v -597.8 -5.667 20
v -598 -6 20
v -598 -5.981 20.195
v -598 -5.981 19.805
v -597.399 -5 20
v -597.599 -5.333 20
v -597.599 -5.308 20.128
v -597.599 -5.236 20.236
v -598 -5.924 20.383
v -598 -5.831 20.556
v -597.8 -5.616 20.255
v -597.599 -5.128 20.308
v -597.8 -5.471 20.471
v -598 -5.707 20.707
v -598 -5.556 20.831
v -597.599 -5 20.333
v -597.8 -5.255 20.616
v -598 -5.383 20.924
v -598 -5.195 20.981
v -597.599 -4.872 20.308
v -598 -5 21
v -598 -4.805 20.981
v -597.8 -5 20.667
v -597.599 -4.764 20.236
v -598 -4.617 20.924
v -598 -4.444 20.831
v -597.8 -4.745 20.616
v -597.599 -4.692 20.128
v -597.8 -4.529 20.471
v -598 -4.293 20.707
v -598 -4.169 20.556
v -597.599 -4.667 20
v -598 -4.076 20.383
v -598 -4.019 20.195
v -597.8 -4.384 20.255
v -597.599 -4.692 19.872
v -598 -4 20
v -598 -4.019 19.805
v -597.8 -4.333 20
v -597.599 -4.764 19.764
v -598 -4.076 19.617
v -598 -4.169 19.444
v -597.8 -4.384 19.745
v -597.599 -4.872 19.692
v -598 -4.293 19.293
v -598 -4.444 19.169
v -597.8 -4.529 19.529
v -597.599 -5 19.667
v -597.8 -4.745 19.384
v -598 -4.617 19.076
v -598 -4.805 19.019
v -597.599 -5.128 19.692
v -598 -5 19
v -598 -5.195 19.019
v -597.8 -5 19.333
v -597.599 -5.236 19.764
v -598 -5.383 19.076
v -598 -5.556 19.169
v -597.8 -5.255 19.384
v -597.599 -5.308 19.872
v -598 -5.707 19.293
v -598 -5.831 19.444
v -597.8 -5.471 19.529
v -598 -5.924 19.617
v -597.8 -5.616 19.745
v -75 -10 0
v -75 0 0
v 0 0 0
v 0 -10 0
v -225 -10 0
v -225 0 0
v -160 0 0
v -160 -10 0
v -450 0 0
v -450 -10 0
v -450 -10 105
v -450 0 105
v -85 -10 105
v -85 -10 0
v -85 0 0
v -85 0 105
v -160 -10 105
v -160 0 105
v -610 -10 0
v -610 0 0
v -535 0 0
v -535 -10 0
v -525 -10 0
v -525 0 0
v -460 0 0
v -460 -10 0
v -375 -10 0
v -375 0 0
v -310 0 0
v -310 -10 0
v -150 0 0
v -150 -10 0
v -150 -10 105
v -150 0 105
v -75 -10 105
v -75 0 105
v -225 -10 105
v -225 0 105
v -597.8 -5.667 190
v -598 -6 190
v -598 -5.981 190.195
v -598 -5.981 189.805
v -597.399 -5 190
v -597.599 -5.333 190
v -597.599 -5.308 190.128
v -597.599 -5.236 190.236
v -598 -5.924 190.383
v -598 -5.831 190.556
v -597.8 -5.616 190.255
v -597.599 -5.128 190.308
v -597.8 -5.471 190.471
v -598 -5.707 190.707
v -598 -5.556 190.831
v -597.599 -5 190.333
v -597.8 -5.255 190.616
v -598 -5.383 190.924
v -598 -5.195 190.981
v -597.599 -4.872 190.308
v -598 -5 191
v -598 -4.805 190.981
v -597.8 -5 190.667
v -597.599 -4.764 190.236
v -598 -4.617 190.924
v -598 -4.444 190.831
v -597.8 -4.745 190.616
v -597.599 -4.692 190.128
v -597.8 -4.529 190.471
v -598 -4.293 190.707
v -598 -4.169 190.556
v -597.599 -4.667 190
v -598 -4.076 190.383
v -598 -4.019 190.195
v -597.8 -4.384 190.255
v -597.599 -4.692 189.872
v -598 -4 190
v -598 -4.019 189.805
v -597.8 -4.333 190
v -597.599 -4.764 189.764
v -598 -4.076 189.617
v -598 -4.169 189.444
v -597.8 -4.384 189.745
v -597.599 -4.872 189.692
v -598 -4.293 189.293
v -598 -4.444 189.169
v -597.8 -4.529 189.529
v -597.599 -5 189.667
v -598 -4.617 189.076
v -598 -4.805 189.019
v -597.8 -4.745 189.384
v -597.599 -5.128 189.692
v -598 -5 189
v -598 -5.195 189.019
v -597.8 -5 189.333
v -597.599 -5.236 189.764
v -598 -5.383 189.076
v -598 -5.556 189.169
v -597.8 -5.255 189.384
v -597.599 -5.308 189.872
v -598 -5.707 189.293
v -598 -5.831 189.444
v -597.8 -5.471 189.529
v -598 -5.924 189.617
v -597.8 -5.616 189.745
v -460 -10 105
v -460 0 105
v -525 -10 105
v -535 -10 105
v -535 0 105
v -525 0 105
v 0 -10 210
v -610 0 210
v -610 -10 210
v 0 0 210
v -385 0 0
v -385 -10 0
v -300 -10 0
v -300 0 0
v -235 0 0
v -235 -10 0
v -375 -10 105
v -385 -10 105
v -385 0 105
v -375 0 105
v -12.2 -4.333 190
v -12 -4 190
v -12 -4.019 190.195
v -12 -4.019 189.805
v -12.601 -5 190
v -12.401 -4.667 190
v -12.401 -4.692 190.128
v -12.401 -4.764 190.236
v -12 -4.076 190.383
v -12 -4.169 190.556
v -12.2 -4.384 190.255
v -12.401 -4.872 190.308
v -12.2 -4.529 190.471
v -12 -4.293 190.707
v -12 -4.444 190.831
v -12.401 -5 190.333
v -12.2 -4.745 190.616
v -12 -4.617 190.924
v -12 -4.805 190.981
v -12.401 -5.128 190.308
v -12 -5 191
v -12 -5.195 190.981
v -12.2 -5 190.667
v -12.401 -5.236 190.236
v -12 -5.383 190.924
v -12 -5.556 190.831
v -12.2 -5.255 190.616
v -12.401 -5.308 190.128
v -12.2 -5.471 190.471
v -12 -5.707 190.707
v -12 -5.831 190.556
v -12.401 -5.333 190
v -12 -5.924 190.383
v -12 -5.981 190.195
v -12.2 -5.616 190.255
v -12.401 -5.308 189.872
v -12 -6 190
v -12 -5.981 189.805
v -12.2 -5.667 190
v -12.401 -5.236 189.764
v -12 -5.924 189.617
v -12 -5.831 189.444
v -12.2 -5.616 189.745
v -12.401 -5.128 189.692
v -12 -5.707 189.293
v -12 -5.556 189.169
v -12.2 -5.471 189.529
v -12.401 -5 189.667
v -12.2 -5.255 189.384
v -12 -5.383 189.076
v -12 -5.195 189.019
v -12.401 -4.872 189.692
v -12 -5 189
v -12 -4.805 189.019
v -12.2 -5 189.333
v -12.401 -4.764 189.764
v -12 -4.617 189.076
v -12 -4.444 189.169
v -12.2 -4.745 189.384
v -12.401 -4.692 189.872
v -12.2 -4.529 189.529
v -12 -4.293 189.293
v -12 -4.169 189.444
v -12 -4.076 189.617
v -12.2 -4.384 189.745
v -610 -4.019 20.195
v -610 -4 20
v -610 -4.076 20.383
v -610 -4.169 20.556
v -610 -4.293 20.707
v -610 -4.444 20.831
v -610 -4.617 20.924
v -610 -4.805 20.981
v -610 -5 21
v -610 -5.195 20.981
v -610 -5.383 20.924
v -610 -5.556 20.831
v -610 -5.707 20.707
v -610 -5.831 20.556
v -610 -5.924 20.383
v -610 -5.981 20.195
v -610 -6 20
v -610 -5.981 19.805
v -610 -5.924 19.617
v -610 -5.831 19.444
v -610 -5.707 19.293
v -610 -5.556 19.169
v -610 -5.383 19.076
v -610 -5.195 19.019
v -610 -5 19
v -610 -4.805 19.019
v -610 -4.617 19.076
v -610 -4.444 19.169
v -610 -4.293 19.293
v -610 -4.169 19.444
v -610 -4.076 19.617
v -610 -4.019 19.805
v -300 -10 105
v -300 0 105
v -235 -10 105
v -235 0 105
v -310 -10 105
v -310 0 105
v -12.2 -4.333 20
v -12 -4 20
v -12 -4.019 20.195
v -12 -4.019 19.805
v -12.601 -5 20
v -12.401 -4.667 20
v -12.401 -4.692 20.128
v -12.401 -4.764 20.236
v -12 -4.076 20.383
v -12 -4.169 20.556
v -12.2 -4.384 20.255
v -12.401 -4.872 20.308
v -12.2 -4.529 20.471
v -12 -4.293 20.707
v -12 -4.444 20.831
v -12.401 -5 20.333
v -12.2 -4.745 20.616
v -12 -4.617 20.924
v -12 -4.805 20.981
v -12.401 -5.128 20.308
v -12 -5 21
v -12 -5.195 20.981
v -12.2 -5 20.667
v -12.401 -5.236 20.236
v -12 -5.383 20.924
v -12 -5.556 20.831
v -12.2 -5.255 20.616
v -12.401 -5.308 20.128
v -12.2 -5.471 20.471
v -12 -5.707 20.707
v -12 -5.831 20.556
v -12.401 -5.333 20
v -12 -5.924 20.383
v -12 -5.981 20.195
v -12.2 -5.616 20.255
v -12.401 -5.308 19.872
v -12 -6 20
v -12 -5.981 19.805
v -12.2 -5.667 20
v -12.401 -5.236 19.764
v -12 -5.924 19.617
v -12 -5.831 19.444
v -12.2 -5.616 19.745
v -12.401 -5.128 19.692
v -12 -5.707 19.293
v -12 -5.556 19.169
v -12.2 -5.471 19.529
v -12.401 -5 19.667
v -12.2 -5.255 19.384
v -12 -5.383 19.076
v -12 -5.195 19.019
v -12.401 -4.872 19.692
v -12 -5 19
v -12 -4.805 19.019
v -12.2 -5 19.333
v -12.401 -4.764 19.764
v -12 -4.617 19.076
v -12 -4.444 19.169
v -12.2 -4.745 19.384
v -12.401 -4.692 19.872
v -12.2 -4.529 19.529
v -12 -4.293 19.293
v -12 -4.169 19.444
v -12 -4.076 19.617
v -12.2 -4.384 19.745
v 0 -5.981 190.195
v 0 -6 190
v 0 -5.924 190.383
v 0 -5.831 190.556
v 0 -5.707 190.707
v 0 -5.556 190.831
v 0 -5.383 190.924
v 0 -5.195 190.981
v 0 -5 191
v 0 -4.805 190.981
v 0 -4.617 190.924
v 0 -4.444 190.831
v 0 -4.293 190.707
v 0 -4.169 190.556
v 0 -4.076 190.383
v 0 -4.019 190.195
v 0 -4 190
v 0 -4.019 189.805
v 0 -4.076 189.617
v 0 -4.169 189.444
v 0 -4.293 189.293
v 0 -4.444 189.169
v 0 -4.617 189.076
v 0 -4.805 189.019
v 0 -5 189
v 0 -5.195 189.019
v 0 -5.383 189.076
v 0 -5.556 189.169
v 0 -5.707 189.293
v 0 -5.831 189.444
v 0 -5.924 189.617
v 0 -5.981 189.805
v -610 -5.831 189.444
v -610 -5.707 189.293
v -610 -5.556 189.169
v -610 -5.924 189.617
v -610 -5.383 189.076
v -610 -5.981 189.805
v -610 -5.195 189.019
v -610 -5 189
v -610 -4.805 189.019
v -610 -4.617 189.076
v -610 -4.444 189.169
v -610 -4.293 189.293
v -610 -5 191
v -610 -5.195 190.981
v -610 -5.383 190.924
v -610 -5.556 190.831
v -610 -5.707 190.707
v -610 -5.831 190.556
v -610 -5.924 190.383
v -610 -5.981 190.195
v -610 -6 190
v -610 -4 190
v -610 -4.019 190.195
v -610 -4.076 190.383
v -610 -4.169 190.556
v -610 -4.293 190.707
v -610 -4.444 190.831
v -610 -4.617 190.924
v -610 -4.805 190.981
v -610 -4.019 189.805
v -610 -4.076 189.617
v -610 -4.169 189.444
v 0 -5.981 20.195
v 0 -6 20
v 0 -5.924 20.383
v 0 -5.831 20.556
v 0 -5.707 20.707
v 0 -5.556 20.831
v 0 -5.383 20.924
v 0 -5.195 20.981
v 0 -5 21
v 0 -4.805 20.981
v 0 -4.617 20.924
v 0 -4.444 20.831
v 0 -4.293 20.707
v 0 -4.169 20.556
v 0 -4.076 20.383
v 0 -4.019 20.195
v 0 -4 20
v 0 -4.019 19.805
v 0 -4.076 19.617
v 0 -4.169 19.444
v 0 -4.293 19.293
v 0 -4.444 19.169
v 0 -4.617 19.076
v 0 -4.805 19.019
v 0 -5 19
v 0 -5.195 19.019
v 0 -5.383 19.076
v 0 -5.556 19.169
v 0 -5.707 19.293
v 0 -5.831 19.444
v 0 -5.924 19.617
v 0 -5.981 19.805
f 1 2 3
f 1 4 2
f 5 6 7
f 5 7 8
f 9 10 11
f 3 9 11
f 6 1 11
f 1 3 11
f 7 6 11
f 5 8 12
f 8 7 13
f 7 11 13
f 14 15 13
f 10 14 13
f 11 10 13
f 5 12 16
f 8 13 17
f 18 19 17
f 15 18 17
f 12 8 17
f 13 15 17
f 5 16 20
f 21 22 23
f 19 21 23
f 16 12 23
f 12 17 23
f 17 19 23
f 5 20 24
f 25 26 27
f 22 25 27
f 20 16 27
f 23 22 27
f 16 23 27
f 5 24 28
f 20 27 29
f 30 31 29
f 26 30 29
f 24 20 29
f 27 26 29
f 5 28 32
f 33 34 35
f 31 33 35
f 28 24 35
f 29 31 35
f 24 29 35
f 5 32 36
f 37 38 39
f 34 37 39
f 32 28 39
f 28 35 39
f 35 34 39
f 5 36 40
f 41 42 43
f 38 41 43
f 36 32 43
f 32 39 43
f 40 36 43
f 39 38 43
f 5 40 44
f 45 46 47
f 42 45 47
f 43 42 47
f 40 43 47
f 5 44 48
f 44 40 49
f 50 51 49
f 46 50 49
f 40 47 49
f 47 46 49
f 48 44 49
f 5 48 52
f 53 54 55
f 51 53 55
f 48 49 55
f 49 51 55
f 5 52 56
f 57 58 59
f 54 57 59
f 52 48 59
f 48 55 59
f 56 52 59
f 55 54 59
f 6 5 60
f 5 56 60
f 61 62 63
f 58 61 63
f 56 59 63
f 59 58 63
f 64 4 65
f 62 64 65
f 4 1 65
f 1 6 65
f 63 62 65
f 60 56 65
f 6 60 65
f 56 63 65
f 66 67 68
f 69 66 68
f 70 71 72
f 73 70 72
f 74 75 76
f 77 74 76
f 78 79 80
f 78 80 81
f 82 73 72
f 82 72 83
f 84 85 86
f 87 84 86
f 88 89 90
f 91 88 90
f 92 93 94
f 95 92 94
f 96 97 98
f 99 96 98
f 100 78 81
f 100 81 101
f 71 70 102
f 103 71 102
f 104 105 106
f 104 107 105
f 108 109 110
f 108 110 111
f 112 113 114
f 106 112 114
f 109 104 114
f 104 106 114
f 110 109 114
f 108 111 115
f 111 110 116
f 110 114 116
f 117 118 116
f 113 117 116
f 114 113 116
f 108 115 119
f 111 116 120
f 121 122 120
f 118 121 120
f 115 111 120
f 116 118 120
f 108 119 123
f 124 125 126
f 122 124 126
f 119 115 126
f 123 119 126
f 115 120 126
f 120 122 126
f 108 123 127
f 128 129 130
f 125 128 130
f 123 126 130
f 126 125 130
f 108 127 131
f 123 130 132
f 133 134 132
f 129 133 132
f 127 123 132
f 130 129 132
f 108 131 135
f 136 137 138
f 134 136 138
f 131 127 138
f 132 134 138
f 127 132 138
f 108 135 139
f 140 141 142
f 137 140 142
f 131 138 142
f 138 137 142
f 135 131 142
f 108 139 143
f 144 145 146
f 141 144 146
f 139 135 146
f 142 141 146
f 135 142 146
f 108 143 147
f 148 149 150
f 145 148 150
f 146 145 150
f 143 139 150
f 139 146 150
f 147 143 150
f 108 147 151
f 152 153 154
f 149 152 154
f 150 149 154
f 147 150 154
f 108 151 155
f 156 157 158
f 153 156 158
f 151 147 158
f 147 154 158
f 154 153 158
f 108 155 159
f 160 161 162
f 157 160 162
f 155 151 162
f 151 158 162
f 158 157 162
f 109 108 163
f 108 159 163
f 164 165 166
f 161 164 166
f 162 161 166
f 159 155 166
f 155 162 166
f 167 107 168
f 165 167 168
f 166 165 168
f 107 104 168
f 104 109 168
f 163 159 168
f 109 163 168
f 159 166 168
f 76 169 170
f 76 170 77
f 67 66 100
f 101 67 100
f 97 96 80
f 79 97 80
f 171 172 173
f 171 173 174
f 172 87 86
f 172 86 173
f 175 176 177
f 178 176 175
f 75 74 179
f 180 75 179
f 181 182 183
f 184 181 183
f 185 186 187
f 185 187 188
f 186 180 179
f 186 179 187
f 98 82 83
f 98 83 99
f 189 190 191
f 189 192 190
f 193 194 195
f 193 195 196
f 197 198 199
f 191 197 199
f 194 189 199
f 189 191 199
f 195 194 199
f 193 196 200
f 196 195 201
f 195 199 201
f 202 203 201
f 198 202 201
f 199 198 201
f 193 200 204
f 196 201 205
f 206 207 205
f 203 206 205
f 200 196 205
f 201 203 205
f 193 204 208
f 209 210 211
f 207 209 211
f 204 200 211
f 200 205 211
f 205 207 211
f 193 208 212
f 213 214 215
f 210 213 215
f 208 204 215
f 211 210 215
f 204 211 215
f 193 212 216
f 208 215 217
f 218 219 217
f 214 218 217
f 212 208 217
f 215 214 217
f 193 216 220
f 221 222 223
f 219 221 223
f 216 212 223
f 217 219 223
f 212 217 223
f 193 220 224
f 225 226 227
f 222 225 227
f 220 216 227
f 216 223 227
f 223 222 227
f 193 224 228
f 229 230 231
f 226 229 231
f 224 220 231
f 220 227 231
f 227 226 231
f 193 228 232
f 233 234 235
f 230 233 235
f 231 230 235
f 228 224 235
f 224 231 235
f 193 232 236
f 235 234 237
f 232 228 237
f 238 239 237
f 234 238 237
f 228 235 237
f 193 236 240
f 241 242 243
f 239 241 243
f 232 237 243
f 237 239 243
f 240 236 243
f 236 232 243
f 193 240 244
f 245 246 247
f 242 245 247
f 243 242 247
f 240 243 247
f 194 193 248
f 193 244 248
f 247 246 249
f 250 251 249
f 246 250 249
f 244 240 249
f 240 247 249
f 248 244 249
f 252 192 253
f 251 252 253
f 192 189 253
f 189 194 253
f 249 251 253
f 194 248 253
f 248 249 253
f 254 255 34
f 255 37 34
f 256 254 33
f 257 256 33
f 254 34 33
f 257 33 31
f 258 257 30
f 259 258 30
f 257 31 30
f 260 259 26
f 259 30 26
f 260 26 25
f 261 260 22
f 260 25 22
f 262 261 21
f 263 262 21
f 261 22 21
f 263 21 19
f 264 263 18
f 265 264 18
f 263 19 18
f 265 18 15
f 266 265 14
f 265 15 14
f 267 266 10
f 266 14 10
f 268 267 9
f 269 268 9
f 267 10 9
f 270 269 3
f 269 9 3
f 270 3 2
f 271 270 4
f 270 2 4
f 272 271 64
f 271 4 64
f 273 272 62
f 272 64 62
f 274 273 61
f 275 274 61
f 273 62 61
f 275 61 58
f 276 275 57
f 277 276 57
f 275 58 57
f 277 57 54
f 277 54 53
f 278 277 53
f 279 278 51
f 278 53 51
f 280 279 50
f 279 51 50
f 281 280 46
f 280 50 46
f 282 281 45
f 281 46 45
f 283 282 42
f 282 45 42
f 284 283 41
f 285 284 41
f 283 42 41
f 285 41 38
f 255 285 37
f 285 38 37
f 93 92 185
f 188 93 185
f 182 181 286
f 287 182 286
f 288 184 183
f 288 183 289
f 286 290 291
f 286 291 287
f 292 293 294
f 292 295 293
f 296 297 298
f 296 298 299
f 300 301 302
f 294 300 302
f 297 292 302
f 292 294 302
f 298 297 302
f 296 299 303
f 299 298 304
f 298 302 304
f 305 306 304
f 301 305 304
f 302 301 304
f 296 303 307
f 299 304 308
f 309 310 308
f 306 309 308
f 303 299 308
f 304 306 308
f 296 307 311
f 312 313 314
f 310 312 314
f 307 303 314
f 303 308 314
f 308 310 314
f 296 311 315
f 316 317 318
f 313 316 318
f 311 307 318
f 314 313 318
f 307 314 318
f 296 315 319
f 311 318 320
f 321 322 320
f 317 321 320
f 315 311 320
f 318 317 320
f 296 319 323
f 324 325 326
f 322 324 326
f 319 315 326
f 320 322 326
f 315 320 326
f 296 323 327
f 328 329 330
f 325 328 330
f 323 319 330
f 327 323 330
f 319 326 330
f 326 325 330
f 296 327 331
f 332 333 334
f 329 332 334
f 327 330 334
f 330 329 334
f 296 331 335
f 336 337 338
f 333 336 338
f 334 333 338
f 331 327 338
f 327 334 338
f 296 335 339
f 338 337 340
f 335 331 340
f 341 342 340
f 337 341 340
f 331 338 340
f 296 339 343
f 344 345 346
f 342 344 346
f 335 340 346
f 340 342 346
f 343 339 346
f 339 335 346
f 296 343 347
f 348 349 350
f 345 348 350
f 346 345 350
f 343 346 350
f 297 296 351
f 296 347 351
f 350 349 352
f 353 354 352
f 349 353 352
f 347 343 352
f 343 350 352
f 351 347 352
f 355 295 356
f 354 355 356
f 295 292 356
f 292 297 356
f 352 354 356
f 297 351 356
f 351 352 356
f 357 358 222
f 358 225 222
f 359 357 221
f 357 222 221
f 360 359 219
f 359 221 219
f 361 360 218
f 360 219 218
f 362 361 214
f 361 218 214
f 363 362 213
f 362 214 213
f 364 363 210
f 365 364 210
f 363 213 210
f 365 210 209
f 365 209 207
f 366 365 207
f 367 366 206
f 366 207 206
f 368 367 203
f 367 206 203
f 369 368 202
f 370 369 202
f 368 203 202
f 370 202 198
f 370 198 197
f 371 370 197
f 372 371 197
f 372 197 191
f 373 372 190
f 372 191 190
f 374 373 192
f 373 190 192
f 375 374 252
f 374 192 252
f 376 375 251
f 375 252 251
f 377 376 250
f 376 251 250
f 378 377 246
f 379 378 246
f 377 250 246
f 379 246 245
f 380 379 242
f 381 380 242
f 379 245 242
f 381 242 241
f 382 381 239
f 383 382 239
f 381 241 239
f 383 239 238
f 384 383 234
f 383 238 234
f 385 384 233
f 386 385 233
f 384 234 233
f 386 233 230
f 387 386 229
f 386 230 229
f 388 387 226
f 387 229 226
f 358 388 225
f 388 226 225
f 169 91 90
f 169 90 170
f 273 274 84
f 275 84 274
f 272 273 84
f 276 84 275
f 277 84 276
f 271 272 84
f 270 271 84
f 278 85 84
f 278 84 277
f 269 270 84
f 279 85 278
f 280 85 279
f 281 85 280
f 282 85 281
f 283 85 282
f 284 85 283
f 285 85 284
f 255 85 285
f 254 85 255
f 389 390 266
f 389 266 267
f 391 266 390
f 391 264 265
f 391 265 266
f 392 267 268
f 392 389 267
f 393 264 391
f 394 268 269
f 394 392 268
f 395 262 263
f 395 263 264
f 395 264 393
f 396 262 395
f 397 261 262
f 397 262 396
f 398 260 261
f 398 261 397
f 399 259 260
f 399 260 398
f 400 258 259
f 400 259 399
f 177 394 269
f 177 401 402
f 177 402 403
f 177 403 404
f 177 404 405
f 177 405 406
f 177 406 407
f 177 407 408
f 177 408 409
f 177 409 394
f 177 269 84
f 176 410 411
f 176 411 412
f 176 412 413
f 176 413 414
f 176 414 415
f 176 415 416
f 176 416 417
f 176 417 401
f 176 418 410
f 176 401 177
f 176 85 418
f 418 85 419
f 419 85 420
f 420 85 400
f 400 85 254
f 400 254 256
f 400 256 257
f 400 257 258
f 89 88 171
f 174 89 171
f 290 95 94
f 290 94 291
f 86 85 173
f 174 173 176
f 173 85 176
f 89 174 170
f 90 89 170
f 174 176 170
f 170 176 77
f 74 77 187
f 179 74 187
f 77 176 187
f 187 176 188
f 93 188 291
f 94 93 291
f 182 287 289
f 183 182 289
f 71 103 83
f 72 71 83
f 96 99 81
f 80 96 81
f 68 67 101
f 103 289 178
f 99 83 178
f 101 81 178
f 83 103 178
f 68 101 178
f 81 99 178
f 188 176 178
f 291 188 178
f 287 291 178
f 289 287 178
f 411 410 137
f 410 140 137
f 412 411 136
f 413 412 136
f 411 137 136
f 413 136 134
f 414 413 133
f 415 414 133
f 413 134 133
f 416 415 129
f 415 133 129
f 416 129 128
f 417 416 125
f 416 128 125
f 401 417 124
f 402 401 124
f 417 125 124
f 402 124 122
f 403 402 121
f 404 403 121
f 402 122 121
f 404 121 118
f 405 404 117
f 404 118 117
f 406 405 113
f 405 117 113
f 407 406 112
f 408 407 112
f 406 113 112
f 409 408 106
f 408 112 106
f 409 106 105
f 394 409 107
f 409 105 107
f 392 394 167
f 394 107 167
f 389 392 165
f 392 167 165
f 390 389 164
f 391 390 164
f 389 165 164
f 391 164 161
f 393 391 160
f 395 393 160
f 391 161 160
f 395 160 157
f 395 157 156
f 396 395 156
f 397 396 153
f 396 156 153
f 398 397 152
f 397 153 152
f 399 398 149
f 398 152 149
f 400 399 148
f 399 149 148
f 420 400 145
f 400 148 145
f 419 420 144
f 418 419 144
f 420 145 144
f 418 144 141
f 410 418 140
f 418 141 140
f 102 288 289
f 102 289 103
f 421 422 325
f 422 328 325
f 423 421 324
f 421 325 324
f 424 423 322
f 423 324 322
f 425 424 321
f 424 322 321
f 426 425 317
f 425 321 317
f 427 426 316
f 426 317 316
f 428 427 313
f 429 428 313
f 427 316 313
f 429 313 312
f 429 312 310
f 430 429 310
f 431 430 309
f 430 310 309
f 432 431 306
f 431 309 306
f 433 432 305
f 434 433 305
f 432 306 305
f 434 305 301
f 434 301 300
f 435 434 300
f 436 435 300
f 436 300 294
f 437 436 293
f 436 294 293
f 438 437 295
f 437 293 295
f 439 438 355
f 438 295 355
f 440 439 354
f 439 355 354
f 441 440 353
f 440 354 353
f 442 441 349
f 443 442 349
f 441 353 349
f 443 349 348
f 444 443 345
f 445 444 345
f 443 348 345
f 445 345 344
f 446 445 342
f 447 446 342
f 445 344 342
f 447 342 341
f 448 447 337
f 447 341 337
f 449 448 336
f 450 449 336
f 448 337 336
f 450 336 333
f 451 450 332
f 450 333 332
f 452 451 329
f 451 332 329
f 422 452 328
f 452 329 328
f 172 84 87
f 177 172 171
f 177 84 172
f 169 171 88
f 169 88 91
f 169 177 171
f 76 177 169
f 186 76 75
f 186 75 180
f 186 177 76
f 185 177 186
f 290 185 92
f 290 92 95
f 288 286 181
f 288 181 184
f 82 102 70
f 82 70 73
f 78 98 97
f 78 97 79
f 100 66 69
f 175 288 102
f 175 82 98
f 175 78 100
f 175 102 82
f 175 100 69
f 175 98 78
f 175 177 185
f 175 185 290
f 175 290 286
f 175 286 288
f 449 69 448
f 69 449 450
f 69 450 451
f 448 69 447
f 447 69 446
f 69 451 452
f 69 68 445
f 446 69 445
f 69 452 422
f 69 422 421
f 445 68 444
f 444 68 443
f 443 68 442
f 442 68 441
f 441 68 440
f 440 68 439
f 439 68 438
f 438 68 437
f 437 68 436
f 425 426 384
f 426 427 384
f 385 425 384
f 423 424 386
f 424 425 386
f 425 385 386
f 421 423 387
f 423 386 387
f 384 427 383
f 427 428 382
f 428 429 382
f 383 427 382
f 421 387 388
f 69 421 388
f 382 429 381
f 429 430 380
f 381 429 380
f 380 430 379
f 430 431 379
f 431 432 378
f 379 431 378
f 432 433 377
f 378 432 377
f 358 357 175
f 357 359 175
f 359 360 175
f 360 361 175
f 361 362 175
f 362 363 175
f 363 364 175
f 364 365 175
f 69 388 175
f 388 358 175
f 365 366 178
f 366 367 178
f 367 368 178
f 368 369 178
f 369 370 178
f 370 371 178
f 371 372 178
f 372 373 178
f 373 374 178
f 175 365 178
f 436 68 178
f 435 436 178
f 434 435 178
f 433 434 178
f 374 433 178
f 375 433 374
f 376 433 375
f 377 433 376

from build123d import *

# Parameters (mm, degrees)
F0_W     = 610
F0_H     = 210
F1_DEPTH = 10
F2_W     = 10
F2_H     = 105
F3_DEPTH = 25
F5_D     = 2
F5_DEPTH = 12
F5_TIP   = 0.600860619
F7_D     = 2
F7_DEPTH = 12
F7_TIP   = 0.600860619


with BuildPart() as f1:
    # F0 (on Front) → F1 (new body)
    with BuildSketch(Plane.XZ):
        with Locations((-305, 105)):
            Rectangle(F0_W, F0_H)
    extrude(amount=F1_DEPTH)

    # F2 (on face) → F3 (cut)
    with BuildSketch(Plane.XZ.offset(10)):
        with Locations((-530, 52.5)):
            Rectangle(F2_W, F2_H)
        with Locations((-455, 52.5)):
            Rectangle(F2_W, F2_H)
        with Locations((-380, 52.5)):
            Rectangle(F2_W, F2_H)
        with Locations((-230, 52.5)):
            Rectangle(F2_W, F2_H)
        with Locations((-155, 52.5)):
            Rectangle(F2_W, F2_H)
        with Locations((-305, 52.5)):
            Rectangle(F2_W, F2_H)
        with Locations((-80, 52.5)):
            Rectangle(F2_W, F2_H)
    extrude(amount=-F3_DEPTH, mode=Mode.SUBTRACT)

    # F5
    with Locations(Plane(origin=(-610, 0, 0), x_dir=(0, -1, 0), z_dir=(-1, 0, 0))):
        with Locations((5, 190), (5, 20)):
            Hole(F5_D / 2, depth=F5_DEPTH)
            with Locations((0, 0, -(F5_DEPTH + F5_TIP / 2))):  # 118° drill point
                Cone(0, F5_D / 2, F5_TIP, mode=Mode.SUBTRACT)

    # F7
    with Locations(Plane.YZ):
        with Locations((-5, 190), (-5, 20)):
            Hole(F7_D / 2, depth=F7_DEPTH)
            with Locations((0, 0, -(F7_DEPTH + F7_TIP / 2))):  # 118° drill point
                Cone(0, F7_D / 2, F7_TIP, mode=Mode.SUBTRACT)


solid = f1.part
